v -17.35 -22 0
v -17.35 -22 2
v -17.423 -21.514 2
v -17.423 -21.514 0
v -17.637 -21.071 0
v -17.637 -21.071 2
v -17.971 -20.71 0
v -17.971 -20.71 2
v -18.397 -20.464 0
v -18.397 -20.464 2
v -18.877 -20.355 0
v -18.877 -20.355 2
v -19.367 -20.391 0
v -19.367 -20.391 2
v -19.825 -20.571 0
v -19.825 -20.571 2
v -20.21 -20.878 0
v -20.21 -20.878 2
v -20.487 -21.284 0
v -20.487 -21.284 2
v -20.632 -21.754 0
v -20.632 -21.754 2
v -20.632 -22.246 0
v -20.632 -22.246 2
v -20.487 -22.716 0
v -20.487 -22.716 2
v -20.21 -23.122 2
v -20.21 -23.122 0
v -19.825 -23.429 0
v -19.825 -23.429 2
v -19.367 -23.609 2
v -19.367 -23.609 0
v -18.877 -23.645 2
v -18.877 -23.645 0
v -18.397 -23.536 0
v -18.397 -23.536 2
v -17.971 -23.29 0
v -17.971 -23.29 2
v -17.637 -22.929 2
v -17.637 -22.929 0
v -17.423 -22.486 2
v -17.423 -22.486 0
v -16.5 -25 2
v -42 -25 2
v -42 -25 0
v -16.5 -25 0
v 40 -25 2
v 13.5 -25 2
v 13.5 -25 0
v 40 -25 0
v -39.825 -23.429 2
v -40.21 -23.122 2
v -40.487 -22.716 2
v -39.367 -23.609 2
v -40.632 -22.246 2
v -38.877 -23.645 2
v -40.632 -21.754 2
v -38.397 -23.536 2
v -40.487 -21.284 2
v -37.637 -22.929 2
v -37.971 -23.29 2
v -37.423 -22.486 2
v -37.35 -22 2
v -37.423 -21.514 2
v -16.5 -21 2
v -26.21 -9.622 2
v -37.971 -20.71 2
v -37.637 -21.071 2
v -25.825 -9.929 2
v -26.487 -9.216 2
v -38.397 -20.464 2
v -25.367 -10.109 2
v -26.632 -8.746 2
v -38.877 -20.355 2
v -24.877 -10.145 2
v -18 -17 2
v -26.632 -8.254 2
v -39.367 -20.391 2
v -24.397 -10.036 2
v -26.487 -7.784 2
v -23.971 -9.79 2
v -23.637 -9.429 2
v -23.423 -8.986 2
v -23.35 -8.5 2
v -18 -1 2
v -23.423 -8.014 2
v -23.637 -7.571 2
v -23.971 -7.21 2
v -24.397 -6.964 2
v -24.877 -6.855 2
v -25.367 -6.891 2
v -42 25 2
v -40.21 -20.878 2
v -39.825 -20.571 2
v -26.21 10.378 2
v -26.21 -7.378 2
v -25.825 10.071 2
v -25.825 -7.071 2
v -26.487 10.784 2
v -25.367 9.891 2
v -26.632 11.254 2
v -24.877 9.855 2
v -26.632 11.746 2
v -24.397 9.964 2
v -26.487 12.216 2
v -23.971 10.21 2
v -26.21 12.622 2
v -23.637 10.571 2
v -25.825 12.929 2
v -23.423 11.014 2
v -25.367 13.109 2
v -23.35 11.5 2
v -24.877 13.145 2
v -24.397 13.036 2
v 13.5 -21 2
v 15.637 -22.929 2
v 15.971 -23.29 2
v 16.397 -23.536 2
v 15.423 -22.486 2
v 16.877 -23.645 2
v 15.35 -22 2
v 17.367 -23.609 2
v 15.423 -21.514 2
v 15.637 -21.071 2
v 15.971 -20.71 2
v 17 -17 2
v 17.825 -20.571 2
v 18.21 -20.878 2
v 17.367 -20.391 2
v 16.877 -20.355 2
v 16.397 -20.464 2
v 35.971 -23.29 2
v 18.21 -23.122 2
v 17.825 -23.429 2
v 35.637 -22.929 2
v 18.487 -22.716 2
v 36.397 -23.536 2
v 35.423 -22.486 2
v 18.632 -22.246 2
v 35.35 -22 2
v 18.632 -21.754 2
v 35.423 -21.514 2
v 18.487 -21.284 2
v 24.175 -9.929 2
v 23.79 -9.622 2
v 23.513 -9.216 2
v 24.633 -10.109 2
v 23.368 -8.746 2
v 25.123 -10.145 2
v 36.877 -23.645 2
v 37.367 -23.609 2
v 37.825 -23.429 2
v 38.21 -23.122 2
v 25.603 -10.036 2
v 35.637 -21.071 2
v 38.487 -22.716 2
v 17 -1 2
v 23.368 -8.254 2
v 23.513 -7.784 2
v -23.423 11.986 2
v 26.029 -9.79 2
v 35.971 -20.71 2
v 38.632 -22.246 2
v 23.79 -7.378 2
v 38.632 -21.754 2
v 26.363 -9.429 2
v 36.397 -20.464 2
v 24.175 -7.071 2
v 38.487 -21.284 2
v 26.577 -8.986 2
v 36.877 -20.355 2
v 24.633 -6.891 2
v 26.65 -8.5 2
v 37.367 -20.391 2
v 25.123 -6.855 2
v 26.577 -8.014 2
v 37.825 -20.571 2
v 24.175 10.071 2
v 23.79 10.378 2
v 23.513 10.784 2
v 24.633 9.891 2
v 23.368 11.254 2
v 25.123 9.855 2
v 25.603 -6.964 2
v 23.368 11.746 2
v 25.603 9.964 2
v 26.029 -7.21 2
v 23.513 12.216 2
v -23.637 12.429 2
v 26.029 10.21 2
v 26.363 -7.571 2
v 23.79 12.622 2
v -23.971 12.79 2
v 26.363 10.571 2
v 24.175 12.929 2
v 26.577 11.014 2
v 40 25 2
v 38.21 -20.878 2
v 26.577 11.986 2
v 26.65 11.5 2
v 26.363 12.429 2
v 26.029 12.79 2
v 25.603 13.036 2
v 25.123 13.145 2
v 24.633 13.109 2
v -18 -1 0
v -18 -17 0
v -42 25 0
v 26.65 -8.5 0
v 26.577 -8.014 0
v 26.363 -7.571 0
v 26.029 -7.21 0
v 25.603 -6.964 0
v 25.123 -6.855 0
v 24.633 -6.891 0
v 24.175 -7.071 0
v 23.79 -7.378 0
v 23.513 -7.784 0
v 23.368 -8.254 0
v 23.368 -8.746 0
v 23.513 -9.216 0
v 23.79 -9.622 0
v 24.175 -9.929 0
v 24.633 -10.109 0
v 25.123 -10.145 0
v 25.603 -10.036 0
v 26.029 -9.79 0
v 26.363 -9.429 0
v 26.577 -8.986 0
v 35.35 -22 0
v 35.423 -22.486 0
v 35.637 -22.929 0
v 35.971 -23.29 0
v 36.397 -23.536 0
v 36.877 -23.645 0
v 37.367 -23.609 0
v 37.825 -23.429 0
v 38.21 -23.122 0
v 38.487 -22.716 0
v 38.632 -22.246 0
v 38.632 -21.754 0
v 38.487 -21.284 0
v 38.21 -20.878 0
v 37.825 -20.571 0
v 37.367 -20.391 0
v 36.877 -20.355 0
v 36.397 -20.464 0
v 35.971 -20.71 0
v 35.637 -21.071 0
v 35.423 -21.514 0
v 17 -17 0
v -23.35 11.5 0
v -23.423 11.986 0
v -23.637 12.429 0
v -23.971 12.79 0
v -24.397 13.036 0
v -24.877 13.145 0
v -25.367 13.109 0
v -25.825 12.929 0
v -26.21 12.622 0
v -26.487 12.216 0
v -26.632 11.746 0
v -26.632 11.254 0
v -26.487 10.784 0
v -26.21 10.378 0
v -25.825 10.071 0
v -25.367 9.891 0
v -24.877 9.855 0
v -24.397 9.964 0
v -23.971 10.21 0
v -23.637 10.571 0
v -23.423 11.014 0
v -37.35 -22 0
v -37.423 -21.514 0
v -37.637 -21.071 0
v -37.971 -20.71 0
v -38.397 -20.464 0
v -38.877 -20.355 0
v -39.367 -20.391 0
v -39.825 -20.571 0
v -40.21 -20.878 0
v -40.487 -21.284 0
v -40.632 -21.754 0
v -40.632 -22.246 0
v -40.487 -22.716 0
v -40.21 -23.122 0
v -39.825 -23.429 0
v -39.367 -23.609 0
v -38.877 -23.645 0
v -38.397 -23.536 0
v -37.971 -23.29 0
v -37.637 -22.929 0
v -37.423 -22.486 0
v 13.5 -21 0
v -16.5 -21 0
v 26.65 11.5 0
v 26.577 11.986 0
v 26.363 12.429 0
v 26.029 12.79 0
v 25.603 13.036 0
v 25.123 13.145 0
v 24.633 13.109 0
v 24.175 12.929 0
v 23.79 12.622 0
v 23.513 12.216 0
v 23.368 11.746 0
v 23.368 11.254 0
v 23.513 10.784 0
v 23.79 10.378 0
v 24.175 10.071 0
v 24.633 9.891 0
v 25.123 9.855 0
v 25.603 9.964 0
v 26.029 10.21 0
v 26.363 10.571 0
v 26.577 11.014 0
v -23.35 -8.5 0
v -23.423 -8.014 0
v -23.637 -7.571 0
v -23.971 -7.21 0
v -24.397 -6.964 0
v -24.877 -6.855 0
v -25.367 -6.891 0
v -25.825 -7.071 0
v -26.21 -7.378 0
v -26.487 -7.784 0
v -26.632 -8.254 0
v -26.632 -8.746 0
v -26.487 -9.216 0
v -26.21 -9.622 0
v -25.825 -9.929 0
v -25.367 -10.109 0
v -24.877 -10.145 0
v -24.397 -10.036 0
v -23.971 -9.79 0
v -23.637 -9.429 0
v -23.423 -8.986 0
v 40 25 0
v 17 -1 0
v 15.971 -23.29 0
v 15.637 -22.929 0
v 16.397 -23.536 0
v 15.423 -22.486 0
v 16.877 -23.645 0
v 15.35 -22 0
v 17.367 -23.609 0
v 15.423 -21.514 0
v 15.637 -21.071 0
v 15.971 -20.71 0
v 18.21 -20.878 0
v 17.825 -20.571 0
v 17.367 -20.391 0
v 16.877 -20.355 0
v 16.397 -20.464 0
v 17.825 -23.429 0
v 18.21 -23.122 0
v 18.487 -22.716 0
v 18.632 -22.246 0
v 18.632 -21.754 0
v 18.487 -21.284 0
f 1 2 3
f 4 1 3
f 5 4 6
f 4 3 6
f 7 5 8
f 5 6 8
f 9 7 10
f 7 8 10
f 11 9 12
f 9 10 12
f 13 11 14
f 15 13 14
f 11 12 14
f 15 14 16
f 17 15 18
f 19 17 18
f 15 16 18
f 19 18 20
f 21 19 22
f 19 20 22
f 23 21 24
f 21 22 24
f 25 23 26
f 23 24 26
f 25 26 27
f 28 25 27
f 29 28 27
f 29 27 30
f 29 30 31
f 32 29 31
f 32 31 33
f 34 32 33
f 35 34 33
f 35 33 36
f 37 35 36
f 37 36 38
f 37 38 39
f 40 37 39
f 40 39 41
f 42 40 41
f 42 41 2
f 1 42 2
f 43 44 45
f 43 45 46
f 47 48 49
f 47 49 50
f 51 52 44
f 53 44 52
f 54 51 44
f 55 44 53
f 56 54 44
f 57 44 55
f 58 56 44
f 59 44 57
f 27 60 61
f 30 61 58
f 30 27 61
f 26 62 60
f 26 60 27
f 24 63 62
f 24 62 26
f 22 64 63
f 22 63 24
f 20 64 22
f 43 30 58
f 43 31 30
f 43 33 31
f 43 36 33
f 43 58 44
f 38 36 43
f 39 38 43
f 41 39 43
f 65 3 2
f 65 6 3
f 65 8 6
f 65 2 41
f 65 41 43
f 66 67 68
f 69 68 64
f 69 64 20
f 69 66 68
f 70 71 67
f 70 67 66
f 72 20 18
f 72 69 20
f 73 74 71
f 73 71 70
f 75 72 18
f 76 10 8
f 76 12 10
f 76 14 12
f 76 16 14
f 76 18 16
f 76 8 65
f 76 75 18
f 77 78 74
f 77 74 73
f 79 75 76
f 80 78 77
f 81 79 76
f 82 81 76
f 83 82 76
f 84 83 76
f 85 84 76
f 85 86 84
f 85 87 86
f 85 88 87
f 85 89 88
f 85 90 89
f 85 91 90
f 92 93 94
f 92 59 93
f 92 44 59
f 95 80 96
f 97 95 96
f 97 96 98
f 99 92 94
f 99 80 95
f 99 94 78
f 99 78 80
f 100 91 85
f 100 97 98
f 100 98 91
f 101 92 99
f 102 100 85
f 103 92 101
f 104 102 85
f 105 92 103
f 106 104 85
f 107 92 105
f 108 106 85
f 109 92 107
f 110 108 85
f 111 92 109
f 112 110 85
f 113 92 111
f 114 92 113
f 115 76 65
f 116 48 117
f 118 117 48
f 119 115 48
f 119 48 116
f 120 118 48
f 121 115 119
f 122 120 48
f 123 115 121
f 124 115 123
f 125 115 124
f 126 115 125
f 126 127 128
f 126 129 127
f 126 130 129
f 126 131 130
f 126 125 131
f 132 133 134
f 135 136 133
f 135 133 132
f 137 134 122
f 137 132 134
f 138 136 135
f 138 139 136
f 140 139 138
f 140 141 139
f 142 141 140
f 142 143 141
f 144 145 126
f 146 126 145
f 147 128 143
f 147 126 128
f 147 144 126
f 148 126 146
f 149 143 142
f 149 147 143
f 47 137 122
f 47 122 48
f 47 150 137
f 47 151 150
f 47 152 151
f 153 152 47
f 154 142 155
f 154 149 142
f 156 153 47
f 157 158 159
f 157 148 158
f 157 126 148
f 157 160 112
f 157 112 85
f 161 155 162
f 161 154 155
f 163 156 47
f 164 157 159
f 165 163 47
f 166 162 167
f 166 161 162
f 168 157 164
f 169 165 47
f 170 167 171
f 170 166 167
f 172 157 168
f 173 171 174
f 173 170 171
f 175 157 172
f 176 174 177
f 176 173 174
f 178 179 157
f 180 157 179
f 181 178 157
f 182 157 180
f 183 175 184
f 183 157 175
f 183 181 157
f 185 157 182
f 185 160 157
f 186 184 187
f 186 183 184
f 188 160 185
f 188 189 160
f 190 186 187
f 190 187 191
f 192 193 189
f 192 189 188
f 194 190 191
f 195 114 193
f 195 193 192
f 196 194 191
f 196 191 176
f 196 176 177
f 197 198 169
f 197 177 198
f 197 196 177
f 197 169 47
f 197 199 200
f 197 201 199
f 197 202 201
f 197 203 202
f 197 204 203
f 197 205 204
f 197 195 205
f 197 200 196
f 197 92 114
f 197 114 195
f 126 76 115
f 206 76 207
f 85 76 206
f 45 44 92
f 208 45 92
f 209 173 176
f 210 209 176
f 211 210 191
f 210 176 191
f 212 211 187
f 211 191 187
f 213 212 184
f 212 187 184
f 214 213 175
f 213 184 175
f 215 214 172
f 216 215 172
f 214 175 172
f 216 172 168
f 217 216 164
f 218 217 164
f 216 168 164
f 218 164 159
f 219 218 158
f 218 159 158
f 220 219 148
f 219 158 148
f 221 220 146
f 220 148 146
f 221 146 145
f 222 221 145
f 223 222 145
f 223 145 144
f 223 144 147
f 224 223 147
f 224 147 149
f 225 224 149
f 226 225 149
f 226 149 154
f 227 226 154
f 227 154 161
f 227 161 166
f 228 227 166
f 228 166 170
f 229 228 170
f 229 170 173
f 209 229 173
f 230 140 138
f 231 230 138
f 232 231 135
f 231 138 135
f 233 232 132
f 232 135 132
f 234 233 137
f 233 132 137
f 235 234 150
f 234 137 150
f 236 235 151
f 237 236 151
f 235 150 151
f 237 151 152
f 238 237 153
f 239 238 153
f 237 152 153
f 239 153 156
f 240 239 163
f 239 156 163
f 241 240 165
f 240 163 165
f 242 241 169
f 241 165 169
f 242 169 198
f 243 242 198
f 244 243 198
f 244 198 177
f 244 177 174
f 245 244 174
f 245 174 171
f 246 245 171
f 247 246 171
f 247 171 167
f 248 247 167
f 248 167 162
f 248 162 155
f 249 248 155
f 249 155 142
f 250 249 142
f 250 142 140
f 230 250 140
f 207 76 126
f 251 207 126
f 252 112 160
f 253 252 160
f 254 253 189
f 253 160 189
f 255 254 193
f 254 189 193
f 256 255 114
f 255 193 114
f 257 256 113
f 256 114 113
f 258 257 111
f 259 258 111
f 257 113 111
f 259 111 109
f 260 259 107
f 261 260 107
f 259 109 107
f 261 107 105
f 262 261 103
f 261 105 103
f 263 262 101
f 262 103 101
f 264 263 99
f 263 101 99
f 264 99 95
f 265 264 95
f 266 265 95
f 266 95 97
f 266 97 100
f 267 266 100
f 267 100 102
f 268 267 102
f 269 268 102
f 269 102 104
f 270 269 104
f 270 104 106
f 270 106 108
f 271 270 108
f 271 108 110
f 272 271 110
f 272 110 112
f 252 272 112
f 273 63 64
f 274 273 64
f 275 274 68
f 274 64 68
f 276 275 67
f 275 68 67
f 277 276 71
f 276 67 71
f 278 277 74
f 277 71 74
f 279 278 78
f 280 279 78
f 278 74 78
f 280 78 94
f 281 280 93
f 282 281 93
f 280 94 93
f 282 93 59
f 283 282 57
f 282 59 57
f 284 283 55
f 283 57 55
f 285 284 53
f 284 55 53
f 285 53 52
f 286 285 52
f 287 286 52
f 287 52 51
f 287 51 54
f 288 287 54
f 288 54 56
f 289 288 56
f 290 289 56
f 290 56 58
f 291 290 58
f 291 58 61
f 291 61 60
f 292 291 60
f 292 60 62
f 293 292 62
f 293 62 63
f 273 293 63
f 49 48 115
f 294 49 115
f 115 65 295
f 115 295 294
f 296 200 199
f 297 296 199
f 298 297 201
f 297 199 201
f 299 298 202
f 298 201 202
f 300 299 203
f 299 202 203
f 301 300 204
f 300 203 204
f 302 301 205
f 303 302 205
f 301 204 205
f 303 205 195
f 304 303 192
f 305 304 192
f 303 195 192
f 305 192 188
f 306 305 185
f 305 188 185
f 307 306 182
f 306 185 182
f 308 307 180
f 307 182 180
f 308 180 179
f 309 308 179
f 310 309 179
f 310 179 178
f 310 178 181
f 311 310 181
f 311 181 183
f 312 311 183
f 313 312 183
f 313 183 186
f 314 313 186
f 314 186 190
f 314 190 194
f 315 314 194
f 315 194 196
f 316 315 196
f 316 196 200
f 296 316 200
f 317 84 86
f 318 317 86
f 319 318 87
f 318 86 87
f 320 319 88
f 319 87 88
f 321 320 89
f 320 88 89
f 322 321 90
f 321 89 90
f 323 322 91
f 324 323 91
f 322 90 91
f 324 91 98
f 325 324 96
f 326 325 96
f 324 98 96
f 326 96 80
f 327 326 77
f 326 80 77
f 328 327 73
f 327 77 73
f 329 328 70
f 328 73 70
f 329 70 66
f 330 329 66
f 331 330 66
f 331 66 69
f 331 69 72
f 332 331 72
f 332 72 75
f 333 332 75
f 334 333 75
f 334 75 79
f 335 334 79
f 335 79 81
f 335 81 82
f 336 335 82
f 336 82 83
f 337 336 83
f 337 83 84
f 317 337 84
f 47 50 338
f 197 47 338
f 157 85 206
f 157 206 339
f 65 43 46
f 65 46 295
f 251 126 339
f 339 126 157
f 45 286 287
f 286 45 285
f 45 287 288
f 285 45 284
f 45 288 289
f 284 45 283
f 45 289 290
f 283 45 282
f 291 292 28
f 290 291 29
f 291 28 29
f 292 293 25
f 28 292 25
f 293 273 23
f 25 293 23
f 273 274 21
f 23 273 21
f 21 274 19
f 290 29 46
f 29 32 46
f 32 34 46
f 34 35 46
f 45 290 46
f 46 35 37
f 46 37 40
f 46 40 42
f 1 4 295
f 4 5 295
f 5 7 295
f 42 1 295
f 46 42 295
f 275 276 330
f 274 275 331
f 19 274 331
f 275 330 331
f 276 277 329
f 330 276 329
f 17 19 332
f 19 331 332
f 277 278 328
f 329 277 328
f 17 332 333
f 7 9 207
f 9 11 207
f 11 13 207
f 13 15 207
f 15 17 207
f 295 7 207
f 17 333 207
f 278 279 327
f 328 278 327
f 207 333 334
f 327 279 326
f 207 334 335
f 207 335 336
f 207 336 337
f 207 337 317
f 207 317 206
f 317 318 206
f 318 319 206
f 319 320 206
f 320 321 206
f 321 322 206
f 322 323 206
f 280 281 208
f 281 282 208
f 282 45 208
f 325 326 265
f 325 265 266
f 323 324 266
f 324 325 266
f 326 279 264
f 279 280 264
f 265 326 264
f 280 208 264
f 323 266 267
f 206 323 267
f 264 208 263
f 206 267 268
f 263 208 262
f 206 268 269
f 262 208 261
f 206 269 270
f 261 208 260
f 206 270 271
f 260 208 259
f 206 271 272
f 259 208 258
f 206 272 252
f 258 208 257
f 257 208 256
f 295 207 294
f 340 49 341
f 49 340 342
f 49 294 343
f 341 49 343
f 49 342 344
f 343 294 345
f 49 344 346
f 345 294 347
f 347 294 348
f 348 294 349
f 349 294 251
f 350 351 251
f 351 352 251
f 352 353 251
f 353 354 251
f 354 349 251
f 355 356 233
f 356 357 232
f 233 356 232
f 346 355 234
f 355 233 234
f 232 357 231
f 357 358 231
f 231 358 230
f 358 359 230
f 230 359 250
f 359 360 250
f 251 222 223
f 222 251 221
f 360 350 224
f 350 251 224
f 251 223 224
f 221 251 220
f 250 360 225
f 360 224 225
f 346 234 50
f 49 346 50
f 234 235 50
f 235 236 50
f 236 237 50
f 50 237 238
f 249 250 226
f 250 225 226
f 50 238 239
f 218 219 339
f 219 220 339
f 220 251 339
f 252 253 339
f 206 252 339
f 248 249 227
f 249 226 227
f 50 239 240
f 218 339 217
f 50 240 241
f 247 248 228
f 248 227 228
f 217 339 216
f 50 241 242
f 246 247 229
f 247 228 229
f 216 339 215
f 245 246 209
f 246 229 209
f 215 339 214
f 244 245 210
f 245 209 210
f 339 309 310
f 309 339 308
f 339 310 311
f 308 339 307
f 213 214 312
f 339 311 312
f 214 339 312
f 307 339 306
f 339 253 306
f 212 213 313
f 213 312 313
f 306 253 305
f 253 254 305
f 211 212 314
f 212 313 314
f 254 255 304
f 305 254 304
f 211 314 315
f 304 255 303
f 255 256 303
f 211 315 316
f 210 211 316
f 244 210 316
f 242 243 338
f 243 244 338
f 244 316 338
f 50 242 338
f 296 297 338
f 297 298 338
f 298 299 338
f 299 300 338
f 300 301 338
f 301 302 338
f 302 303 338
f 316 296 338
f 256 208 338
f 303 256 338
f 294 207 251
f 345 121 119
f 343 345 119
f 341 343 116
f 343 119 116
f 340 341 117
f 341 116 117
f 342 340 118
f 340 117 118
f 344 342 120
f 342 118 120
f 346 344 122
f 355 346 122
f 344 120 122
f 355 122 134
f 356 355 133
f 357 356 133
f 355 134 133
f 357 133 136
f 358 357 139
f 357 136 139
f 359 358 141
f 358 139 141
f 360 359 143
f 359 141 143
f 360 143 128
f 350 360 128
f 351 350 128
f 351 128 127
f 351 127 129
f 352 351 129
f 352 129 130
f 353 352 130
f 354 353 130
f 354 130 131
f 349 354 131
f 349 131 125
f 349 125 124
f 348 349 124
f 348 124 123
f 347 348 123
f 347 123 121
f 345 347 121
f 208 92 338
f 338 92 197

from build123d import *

# Parameters (mm, degrees)
SKETCH_1_W          = 80
SKETCH_1_H          = 50
EXTRUDE_1_DEPTH     = 2
SKETCH_5_W          = 2
SKETCH_5_H          = 50
EXTRUDE_2_DEPTH     = 2
SKETCH_2_W          = 30
SKETCH_2_H          = 4
SKETCH_2_W_2        = 35
SKETCH_2_H_2        = 16
CUT_EXTRUDE_1_DEPTH = 49.918299235
SKETCH_3_R          = 1.65
CUT_EXTRUDE_2_DEPTH = 49.918299235
SKETCH_6_W          = 1.5
SKETCH_6_H          = 4
CUT_EXTRUDE_4_DEPTH = 49.918299235
SKETCH_7_W          = 1.5
SKETCH_7_H          = 4
EXTRUDE_3_DEPTH     = 2
SKETCH_8_R          = 1.65
CUT_EXTRUDE_5_DEPTH = 49.918299235


with BuildPart() as part:
    # 草图1 → 凸台-拉伸1 (new body)
    with BuildSketch(Plane.XY):
        Rectangle(SKETCH_1_W, SKETCH_1_H)
    extrude(amount=EXTRUDE_1_DEPTH)

    # 草图5 → 凸台-拉伸2 (add)
    with BuildSketch(Plane.XY.offset(2)):
        with Locations((-41, 0)):
            Rectangle(SKETCH_5_W, SKETCH_5_H)
    extrude(amount=-EXTRUDE_2_DEPTH)

    # 草图2 → 切除-拉伸1 (cut, through all)
    with BuildSketch(Plane.XY.offset(2)):
        with Locations((0, -23)):
            Rectangle(SKETCH_2_W, SKETCH_2_H)
        with Locations((-0.5, -9)):
            Rectangle(SKETCH_2_W_2, SKETCH_2_H_2)
    extrude(amount=-CUT_EXTRUDE_1_DEPTH, mode=Mode.SUBTRACT)

    # 草图3 → 切除-拉伸2 (cut, through all)
    with BuildSketch(Plane.XY.offset(2)):
        with Locations((-39, -22)):
            Circle(SKETCH_3_R)
        with Locations((-19, -22)):
            Circle(SKETCH_3_R)
        with Locations(Location((17, -22, 0), (0, 0, 180))):
            Circle(SKETCH_3_R)
        with Locations(Location((37, -22, 0), (0, 0, 180))):
            Circle(SKETCH_3_R)
    extrude(amount=-CUT_EXTRUDE_2_DEPTH, mode=Mode.SUBTRACT)

    # 草图6 → 切除-拉伸4 (cut, through all)
    with BuildSketch(Plane.XY.offset(2)):
        with Locations((-15.75, -23)):
            Rectangle(SKETCH_6_W, SKETCH_6_H)
    extrude(amount=-CUT_EXTRUDE_4_DEPTH, mode=Mode.SUBTRACT)

    # 草图7 → 凸台-拉伸3 (add)
    with BuildSketch(Plane.XY.offset(2)):
        with Locations((14.25, -23)):
            Rectangle(SKETCH_7_W, SKETCH_7_H)
    extrude(amount=-EXTRUDE_3_DEPTH)

    # 草图8 → 切除-拉伸5 (cut, through all)
    with BuildSketch(Plane.XY.offset(2)):
        with Locations((-25, 11.5)):
            Circle(SKETCH_8_R)
        with Locations((-25, -8.5)):
            Circle(SKETCH_8_R)
        with Locations((25, -8.5)):
            Circle(SKETCH_8_R)
        with Locations((25, 11.5)):
            Circle(SKETCH_8_R)
    extrude(amount=-CUT_EXTRUDE_5_DEPTH, mode=Mode.SUBTRACT)


solid = part.part
